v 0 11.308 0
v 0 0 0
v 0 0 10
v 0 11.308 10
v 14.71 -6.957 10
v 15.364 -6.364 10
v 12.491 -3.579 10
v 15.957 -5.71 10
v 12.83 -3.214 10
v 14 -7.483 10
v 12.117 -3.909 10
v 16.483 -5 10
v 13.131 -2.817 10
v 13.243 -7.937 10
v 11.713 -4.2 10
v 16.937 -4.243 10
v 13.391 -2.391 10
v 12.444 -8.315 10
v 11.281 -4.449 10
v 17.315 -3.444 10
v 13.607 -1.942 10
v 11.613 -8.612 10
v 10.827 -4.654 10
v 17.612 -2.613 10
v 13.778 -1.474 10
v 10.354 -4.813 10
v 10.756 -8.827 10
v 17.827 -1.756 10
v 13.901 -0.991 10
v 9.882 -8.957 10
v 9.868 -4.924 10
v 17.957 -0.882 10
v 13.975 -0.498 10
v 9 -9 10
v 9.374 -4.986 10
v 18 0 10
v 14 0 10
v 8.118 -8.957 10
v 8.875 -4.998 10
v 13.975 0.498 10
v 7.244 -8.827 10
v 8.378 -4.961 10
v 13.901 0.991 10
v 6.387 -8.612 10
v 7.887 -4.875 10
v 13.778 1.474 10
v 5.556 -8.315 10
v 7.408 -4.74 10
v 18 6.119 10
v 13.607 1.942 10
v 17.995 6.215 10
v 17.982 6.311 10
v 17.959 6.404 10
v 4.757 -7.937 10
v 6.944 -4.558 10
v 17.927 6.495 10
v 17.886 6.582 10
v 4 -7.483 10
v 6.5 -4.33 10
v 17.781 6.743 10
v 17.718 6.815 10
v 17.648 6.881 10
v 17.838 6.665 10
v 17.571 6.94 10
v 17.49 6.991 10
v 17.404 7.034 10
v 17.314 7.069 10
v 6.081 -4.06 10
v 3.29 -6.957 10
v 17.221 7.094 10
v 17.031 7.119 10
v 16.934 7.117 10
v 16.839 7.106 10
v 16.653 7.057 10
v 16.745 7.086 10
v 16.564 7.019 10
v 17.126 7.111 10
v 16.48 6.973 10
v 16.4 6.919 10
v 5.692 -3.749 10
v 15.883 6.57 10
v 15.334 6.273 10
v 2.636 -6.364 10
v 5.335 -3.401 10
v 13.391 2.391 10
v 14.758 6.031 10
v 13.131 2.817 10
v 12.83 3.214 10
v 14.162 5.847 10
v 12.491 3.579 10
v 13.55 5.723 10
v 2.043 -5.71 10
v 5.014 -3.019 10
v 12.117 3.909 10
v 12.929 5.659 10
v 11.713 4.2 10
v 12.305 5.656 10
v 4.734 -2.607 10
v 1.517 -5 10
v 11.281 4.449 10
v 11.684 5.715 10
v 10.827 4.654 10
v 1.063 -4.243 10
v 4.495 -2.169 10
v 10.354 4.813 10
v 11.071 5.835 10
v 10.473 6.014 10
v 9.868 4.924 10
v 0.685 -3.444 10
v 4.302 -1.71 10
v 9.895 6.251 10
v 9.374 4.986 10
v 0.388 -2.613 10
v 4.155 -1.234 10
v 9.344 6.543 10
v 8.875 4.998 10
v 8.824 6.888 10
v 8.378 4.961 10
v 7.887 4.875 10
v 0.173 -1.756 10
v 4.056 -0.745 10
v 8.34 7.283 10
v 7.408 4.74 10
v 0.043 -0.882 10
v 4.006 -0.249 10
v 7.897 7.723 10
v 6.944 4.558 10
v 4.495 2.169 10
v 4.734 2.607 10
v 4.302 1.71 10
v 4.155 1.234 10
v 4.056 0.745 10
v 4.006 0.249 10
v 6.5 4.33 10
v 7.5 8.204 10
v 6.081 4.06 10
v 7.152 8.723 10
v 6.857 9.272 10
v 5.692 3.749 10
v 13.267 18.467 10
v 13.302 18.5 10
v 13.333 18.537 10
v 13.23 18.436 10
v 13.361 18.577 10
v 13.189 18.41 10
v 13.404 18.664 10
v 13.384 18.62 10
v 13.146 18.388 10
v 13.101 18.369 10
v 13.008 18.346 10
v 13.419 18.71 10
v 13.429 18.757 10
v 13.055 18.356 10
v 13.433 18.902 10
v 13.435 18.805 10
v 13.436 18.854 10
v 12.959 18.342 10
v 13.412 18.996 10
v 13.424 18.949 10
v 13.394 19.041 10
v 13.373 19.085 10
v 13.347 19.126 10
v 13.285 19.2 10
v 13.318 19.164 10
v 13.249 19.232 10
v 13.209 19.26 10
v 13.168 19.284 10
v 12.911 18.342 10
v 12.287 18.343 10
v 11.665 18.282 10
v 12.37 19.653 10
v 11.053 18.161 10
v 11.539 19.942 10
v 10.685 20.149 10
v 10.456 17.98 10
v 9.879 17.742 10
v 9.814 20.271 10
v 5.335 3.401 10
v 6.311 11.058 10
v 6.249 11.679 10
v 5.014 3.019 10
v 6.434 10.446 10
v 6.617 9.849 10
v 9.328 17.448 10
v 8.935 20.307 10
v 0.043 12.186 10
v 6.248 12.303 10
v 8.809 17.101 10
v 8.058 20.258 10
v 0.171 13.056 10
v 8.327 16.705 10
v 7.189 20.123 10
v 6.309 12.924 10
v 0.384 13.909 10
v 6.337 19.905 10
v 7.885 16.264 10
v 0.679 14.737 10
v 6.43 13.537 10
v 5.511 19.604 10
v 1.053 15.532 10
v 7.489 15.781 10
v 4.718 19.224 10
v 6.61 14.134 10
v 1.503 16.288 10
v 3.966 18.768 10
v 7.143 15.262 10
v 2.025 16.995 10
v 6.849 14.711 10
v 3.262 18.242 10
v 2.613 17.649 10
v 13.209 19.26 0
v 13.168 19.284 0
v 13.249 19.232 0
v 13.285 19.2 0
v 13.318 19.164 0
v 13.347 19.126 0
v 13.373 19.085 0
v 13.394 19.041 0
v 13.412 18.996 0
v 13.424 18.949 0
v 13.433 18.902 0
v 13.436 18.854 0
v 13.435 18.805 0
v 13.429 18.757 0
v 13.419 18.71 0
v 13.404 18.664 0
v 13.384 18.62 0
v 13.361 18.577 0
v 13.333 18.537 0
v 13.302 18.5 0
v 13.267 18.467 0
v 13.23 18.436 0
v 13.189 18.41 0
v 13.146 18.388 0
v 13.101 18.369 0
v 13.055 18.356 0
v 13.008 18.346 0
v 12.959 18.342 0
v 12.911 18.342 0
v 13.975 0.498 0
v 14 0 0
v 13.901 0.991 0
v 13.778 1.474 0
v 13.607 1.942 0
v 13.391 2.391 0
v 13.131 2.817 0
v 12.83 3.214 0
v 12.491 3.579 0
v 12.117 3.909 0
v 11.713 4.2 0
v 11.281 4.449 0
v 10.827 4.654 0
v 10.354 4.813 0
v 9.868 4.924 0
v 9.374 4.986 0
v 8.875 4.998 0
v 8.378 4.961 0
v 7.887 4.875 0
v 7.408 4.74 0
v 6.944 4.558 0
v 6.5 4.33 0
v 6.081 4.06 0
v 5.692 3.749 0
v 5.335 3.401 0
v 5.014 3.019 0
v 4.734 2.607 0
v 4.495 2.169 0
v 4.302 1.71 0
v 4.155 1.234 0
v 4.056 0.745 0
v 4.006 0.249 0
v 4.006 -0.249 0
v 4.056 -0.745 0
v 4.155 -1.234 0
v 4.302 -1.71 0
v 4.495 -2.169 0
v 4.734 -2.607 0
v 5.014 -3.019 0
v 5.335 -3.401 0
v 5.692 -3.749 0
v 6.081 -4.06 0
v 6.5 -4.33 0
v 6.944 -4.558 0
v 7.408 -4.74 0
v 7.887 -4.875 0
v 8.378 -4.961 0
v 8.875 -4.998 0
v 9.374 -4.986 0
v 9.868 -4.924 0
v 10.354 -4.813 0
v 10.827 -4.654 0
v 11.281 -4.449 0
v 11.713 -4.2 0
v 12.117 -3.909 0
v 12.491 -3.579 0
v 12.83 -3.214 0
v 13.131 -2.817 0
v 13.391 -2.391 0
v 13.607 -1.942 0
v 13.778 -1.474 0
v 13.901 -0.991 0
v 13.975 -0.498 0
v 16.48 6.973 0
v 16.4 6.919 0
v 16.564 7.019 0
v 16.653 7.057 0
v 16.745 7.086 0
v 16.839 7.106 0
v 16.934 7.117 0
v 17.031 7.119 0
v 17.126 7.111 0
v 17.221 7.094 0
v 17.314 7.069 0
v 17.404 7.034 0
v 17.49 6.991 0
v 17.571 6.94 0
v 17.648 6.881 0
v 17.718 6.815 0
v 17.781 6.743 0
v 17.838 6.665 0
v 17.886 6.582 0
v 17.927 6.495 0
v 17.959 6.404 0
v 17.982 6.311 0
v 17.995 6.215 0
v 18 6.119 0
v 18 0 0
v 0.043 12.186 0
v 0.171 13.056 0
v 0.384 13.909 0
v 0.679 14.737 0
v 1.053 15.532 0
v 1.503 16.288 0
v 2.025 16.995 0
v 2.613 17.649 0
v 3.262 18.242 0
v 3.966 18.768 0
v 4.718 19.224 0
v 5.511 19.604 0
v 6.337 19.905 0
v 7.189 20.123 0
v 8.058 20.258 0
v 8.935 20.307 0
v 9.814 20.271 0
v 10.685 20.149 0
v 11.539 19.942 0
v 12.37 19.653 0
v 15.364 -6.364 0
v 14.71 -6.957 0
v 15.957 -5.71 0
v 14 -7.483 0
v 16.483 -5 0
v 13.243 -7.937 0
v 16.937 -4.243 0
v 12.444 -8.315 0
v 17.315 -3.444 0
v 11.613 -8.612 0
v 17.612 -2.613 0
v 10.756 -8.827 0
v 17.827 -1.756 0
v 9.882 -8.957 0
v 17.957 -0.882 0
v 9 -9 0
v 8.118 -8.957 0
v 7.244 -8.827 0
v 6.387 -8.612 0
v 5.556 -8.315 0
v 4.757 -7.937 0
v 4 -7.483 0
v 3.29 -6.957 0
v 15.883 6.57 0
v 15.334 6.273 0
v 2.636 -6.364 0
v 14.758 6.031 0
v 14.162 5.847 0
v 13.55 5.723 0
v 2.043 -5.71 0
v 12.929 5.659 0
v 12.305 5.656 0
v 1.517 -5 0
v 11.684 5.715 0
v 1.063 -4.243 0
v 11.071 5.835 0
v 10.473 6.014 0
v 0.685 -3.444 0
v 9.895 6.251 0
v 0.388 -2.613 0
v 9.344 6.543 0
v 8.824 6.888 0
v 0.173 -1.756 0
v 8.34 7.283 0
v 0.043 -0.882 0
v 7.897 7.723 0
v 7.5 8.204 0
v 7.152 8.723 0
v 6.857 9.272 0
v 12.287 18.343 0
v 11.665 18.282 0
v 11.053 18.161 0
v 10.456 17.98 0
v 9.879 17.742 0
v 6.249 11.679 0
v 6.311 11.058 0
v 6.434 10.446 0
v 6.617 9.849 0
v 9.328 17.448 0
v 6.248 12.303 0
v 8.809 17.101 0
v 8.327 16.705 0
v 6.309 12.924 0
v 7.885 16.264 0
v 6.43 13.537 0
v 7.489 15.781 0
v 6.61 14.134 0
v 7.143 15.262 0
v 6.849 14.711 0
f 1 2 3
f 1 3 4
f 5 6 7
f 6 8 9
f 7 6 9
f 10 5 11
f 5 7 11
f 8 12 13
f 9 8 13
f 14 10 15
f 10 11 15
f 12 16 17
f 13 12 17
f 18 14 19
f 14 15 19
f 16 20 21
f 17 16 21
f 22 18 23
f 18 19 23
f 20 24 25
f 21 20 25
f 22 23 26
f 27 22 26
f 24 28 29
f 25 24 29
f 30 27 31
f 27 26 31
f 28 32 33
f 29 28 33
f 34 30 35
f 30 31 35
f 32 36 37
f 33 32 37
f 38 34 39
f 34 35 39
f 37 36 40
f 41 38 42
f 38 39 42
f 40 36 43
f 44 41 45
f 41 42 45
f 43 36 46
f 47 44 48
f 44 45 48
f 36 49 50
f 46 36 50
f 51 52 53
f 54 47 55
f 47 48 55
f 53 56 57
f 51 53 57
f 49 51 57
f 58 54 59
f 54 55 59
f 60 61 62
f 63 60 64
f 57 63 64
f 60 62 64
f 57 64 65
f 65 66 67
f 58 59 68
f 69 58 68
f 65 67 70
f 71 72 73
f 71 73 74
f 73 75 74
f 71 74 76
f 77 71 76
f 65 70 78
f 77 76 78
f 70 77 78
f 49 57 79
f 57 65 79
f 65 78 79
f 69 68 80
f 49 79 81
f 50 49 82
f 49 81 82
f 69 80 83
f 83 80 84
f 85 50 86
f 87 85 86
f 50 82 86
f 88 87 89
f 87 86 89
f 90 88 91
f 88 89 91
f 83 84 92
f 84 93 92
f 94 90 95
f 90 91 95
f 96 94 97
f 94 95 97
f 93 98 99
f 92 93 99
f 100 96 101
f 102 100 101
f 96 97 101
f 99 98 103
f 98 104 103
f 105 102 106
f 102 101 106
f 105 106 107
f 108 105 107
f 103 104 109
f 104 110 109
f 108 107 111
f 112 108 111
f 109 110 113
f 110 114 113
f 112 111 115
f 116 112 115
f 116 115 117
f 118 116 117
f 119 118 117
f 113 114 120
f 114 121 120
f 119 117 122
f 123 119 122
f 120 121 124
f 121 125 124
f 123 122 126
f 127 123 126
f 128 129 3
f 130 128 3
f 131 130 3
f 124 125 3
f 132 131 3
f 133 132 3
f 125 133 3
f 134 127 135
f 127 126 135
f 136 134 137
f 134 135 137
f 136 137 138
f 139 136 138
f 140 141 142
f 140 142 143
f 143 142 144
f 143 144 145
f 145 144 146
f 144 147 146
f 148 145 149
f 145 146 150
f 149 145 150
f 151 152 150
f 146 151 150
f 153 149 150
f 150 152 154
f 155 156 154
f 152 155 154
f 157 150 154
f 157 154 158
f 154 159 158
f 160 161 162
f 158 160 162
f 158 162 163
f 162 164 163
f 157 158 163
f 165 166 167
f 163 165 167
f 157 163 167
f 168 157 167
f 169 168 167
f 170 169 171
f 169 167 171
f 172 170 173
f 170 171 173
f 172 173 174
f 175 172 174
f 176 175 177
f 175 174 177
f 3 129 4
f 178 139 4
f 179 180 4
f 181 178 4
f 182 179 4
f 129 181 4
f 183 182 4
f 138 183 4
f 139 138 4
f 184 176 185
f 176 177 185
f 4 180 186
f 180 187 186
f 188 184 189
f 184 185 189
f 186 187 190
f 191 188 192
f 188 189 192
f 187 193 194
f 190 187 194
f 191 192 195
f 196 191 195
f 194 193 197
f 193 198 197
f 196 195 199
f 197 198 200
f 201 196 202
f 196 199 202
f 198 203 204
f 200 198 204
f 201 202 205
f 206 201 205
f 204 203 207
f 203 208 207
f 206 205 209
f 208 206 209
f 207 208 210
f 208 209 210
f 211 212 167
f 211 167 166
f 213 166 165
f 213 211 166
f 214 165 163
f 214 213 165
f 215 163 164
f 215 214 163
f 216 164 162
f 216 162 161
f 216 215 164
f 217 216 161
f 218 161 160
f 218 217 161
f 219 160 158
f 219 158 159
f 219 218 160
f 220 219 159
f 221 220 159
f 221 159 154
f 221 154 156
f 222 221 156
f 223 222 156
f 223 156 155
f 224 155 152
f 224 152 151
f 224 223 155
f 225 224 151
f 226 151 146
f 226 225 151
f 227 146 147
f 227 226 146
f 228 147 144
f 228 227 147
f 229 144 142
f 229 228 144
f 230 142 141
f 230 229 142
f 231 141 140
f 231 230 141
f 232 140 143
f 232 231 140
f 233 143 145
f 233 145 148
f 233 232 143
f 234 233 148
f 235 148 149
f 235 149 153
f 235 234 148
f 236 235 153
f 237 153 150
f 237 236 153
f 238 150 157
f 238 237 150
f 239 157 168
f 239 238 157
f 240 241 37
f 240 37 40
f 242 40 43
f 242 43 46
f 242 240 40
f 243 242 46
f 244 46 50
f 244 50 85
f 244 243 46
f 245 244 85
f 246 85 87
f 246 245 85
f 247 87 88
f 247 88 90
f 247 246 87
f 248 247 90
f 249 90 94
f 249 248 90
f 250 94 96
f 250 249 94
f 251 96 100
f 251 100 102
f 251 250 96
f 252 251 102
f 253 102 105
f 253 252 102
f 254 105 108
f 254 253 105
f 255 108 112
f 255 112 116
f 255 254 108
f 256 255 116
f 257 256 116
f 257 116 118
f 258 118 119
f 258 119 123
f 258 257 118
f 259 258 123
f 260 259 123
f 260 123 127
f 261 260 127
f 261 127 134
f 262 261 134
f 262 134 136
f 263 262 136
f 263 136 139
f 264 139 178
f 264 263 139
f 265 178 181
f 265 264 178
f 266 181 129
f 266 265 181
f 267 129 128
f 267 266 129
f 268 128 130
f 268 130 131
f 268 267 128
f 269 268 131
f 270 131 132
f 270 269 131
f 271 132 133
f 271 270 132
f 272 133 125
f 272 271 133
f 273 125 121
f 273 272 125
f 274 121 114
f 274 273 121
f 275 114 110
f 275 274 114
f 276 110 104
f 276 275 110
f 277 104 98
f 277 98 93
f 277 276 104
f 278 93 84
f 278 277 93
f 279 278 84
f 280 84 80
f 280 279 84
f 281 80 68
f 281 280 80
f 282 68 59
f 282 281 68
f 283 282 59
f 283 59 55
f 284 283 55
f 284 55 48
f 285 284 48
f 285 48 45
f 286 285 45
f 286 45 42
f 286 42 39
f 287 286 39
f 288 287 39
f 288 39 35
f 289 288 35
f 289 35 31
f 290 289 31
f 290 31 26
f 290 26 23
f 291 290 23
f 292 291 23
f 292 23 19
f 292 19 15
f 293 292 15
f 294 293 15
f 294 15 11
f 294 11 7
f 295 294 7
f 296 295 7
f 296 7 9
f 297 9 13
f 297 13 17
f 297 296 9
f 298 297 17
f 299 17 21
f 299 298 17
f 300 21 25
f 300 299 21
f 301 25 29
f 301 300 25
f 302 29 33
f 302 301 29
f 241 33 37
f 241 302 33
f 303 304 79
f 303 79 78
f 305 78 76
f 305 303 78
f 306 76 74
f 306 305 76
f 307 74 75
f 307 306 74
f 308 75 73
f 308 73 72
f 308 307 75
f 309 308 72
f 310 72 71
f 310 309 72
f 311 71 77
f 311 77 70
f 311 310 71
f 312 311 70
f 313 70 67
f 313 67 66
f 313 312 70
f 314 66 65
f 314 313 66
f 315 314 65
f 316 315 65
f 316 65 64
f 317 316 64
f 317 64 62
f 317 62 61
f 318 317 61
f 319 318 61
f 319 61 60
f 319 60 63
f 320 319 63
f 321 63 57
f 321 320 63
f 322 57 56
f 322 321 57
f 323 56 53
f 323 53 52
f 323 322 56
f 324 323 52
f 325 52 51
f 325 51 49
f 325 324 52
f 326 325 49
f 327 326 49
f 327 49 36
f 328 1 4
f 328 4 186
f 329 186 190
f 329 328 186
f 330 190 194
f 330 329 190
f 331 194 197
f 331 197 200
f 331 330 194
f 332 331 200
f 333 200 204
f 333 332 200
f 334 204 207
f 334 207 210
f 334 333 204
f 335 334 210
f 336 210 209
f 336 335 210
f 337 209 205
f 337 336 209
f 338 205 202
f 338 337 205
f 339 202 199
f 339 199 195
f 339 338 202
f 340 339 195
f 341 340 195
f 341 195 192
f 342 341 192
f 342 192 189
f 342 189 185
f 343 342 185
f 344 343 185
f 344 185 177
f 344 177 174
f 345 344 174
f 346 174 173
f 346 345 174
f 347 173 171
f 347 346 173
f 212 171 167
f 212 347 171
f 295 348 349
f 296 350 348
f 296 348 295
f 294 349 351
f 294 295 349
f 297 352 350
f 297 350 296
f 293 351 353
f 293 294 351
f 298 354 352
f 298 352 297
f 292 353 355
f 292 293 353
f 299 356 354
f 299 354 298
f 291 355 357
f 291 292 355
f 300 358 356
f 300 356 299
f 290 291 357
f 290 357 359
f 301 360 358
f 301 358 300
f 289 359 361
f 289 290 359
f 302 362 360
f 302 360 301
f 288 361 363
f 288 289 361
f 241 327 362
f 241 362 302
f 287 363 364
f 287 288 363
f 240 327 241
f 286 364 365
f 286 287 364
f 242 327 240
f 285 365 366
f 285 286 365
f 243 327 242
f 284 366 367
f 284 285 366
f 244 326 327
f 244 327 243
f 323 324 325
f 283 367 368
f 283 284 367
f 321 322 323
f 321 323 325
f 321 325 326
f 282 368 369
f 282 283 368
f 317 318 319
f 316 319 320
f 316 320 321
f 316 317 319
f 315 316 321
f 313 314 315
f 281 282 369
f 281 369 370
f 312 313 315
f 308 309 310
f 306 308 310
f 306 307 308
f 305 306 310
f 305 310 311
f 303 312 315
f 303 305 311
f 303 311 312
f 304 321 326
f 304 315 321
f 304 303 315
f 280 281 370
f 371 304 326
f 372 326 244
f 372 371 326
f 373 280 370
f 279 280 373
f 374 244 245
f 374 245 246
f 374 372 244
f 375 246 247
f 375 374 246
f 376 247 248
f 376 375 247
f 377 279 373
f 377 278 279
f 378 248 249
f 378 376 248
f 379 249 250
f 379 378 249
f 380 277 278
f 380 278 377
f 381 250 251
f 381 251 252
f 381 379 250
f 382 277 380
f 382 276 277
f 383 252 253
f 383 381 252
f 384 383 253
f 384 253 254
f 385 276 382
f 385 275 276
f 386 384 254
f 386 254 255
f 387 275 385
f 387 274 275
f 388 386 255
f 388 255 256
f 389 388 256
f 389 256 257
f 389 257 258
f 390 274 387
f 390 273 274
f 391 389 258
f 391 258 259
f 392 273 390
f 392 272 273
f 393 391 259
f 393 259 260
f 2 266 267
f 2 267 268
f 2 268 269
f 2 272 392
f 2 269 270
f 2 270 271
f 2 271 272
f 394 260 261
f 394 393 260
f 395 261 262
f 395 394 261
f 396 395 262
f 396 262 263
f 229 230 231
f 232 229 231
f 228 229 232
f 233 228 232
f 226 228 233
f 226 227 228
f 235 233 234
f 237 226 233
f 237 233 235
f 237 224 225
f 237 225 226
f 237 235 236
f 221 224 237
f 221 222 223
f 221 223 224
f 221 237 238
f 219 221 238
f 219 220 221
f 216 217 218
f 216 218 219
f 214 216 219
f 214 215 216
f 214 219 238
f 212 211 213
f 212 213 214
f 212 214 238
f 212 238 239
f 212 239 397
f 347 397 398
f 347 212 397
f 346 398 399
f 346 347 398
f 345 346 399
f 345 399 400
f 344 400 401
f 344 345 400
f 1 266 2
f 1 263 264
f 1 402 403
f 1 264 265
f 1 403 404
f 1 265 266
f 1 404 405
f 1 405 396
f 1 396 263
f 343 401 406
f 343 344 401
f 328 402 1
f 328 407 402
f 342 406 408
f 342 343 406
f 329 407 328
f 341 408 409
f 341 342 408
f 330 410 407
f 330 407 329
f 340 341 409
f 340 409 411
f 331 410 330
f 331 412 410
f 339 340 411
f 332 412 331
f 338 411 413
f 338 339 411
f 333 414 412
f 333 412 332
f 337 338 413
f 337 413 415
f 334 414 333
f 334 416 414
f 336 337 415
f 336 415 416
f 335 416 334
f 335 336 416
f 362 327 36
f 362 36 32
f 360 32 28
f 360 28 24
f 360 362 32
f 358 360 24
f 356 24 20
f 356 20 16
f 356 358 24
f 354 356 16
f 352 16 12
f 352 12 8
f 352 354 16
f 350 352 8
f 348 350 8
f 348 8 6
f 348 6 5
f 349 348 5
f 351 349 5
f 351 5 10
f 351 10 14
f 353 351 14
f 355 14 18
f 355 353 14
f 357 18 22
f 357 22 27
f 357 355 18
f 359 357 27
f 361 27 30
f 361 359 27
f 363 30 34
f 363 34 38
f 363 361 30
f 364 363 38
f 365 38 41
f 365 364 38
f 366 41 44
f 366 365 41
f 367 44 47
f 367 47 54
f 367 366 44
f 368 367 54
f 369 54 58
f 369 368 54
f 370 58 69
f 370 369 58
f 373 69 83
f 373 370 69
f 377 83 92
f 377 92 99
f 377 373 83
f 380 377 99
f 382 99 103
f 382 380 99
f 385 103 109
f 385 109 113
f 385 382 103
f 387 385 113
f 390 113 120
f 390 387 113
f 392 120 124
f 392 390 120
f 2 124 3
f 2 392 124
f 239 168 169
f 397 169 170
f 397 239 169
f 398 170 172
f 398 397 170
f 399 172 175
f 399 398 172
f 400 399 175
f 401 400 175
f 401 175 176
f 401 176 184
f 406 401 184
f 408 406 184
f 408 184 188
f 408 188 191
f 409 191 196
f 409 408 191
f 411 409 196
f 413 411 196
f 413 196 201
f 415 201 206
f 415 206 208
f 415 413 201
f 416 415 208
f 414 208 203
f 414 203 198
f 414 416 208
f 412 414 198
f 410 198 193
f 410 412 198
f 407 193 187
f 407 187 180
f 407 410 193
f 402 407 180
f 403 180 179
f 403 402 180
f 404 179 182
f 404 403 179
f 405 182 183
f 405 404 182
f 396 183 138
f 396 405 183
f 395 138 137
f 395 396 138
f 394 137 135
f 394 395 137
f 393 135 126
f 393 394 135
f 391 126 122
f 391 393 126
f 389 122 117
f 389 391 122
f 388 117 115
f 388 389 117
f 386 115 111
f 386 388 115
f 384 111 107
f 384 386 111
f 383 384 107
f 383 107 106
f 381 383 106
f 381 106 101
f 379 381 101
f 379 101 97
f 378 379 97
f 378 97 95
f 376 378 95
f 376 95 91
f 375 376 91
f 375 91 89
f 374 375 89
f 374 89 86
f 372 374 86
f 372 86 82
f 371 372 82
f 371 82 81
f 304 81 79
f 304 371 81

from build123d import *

# Parameters (mm, degrees)
SKETCH1_R           = 5
BOSS_EXTRUDE1_DEPTH = 10


with BuildPart() as part:
    # Sketch1 → Boss-Extrude1 (new body)
    with BuildSketch(Plane.XY):
        with BuildLine():
            Line((0, 0), (0, 11.307605315))
            ThreePointArc((0, 11.307605315), (4.336815627, 19.005313513), (13.167713668, 19.284456998))
            ThreePointArc((13.167713668, 19.284456998), (13.418597245, 18.70989145), (12.910980025, 18.341933712))
            ThreePointArc((12.910980025, 18.341933712), (6.518023633, 10.144936613), (16.400138271, 6.919341603))
            ThreePointArc((16.400138271, 6.919341603), (17.447290885, 7.013626461), (18, 6.119237918))
            Line((18, 6.119237918), (18, 0))
            ThreePointArc((18, 0), (9, -9), (0, 0))
        make_face()
        with Locations((9, 0)):
            Circle(SKETCH1_R, mode=Mode.SUBTRACT)
    extrude(amount=BOSS_EXTRUDE1_DEPTH)


solid = part.part
